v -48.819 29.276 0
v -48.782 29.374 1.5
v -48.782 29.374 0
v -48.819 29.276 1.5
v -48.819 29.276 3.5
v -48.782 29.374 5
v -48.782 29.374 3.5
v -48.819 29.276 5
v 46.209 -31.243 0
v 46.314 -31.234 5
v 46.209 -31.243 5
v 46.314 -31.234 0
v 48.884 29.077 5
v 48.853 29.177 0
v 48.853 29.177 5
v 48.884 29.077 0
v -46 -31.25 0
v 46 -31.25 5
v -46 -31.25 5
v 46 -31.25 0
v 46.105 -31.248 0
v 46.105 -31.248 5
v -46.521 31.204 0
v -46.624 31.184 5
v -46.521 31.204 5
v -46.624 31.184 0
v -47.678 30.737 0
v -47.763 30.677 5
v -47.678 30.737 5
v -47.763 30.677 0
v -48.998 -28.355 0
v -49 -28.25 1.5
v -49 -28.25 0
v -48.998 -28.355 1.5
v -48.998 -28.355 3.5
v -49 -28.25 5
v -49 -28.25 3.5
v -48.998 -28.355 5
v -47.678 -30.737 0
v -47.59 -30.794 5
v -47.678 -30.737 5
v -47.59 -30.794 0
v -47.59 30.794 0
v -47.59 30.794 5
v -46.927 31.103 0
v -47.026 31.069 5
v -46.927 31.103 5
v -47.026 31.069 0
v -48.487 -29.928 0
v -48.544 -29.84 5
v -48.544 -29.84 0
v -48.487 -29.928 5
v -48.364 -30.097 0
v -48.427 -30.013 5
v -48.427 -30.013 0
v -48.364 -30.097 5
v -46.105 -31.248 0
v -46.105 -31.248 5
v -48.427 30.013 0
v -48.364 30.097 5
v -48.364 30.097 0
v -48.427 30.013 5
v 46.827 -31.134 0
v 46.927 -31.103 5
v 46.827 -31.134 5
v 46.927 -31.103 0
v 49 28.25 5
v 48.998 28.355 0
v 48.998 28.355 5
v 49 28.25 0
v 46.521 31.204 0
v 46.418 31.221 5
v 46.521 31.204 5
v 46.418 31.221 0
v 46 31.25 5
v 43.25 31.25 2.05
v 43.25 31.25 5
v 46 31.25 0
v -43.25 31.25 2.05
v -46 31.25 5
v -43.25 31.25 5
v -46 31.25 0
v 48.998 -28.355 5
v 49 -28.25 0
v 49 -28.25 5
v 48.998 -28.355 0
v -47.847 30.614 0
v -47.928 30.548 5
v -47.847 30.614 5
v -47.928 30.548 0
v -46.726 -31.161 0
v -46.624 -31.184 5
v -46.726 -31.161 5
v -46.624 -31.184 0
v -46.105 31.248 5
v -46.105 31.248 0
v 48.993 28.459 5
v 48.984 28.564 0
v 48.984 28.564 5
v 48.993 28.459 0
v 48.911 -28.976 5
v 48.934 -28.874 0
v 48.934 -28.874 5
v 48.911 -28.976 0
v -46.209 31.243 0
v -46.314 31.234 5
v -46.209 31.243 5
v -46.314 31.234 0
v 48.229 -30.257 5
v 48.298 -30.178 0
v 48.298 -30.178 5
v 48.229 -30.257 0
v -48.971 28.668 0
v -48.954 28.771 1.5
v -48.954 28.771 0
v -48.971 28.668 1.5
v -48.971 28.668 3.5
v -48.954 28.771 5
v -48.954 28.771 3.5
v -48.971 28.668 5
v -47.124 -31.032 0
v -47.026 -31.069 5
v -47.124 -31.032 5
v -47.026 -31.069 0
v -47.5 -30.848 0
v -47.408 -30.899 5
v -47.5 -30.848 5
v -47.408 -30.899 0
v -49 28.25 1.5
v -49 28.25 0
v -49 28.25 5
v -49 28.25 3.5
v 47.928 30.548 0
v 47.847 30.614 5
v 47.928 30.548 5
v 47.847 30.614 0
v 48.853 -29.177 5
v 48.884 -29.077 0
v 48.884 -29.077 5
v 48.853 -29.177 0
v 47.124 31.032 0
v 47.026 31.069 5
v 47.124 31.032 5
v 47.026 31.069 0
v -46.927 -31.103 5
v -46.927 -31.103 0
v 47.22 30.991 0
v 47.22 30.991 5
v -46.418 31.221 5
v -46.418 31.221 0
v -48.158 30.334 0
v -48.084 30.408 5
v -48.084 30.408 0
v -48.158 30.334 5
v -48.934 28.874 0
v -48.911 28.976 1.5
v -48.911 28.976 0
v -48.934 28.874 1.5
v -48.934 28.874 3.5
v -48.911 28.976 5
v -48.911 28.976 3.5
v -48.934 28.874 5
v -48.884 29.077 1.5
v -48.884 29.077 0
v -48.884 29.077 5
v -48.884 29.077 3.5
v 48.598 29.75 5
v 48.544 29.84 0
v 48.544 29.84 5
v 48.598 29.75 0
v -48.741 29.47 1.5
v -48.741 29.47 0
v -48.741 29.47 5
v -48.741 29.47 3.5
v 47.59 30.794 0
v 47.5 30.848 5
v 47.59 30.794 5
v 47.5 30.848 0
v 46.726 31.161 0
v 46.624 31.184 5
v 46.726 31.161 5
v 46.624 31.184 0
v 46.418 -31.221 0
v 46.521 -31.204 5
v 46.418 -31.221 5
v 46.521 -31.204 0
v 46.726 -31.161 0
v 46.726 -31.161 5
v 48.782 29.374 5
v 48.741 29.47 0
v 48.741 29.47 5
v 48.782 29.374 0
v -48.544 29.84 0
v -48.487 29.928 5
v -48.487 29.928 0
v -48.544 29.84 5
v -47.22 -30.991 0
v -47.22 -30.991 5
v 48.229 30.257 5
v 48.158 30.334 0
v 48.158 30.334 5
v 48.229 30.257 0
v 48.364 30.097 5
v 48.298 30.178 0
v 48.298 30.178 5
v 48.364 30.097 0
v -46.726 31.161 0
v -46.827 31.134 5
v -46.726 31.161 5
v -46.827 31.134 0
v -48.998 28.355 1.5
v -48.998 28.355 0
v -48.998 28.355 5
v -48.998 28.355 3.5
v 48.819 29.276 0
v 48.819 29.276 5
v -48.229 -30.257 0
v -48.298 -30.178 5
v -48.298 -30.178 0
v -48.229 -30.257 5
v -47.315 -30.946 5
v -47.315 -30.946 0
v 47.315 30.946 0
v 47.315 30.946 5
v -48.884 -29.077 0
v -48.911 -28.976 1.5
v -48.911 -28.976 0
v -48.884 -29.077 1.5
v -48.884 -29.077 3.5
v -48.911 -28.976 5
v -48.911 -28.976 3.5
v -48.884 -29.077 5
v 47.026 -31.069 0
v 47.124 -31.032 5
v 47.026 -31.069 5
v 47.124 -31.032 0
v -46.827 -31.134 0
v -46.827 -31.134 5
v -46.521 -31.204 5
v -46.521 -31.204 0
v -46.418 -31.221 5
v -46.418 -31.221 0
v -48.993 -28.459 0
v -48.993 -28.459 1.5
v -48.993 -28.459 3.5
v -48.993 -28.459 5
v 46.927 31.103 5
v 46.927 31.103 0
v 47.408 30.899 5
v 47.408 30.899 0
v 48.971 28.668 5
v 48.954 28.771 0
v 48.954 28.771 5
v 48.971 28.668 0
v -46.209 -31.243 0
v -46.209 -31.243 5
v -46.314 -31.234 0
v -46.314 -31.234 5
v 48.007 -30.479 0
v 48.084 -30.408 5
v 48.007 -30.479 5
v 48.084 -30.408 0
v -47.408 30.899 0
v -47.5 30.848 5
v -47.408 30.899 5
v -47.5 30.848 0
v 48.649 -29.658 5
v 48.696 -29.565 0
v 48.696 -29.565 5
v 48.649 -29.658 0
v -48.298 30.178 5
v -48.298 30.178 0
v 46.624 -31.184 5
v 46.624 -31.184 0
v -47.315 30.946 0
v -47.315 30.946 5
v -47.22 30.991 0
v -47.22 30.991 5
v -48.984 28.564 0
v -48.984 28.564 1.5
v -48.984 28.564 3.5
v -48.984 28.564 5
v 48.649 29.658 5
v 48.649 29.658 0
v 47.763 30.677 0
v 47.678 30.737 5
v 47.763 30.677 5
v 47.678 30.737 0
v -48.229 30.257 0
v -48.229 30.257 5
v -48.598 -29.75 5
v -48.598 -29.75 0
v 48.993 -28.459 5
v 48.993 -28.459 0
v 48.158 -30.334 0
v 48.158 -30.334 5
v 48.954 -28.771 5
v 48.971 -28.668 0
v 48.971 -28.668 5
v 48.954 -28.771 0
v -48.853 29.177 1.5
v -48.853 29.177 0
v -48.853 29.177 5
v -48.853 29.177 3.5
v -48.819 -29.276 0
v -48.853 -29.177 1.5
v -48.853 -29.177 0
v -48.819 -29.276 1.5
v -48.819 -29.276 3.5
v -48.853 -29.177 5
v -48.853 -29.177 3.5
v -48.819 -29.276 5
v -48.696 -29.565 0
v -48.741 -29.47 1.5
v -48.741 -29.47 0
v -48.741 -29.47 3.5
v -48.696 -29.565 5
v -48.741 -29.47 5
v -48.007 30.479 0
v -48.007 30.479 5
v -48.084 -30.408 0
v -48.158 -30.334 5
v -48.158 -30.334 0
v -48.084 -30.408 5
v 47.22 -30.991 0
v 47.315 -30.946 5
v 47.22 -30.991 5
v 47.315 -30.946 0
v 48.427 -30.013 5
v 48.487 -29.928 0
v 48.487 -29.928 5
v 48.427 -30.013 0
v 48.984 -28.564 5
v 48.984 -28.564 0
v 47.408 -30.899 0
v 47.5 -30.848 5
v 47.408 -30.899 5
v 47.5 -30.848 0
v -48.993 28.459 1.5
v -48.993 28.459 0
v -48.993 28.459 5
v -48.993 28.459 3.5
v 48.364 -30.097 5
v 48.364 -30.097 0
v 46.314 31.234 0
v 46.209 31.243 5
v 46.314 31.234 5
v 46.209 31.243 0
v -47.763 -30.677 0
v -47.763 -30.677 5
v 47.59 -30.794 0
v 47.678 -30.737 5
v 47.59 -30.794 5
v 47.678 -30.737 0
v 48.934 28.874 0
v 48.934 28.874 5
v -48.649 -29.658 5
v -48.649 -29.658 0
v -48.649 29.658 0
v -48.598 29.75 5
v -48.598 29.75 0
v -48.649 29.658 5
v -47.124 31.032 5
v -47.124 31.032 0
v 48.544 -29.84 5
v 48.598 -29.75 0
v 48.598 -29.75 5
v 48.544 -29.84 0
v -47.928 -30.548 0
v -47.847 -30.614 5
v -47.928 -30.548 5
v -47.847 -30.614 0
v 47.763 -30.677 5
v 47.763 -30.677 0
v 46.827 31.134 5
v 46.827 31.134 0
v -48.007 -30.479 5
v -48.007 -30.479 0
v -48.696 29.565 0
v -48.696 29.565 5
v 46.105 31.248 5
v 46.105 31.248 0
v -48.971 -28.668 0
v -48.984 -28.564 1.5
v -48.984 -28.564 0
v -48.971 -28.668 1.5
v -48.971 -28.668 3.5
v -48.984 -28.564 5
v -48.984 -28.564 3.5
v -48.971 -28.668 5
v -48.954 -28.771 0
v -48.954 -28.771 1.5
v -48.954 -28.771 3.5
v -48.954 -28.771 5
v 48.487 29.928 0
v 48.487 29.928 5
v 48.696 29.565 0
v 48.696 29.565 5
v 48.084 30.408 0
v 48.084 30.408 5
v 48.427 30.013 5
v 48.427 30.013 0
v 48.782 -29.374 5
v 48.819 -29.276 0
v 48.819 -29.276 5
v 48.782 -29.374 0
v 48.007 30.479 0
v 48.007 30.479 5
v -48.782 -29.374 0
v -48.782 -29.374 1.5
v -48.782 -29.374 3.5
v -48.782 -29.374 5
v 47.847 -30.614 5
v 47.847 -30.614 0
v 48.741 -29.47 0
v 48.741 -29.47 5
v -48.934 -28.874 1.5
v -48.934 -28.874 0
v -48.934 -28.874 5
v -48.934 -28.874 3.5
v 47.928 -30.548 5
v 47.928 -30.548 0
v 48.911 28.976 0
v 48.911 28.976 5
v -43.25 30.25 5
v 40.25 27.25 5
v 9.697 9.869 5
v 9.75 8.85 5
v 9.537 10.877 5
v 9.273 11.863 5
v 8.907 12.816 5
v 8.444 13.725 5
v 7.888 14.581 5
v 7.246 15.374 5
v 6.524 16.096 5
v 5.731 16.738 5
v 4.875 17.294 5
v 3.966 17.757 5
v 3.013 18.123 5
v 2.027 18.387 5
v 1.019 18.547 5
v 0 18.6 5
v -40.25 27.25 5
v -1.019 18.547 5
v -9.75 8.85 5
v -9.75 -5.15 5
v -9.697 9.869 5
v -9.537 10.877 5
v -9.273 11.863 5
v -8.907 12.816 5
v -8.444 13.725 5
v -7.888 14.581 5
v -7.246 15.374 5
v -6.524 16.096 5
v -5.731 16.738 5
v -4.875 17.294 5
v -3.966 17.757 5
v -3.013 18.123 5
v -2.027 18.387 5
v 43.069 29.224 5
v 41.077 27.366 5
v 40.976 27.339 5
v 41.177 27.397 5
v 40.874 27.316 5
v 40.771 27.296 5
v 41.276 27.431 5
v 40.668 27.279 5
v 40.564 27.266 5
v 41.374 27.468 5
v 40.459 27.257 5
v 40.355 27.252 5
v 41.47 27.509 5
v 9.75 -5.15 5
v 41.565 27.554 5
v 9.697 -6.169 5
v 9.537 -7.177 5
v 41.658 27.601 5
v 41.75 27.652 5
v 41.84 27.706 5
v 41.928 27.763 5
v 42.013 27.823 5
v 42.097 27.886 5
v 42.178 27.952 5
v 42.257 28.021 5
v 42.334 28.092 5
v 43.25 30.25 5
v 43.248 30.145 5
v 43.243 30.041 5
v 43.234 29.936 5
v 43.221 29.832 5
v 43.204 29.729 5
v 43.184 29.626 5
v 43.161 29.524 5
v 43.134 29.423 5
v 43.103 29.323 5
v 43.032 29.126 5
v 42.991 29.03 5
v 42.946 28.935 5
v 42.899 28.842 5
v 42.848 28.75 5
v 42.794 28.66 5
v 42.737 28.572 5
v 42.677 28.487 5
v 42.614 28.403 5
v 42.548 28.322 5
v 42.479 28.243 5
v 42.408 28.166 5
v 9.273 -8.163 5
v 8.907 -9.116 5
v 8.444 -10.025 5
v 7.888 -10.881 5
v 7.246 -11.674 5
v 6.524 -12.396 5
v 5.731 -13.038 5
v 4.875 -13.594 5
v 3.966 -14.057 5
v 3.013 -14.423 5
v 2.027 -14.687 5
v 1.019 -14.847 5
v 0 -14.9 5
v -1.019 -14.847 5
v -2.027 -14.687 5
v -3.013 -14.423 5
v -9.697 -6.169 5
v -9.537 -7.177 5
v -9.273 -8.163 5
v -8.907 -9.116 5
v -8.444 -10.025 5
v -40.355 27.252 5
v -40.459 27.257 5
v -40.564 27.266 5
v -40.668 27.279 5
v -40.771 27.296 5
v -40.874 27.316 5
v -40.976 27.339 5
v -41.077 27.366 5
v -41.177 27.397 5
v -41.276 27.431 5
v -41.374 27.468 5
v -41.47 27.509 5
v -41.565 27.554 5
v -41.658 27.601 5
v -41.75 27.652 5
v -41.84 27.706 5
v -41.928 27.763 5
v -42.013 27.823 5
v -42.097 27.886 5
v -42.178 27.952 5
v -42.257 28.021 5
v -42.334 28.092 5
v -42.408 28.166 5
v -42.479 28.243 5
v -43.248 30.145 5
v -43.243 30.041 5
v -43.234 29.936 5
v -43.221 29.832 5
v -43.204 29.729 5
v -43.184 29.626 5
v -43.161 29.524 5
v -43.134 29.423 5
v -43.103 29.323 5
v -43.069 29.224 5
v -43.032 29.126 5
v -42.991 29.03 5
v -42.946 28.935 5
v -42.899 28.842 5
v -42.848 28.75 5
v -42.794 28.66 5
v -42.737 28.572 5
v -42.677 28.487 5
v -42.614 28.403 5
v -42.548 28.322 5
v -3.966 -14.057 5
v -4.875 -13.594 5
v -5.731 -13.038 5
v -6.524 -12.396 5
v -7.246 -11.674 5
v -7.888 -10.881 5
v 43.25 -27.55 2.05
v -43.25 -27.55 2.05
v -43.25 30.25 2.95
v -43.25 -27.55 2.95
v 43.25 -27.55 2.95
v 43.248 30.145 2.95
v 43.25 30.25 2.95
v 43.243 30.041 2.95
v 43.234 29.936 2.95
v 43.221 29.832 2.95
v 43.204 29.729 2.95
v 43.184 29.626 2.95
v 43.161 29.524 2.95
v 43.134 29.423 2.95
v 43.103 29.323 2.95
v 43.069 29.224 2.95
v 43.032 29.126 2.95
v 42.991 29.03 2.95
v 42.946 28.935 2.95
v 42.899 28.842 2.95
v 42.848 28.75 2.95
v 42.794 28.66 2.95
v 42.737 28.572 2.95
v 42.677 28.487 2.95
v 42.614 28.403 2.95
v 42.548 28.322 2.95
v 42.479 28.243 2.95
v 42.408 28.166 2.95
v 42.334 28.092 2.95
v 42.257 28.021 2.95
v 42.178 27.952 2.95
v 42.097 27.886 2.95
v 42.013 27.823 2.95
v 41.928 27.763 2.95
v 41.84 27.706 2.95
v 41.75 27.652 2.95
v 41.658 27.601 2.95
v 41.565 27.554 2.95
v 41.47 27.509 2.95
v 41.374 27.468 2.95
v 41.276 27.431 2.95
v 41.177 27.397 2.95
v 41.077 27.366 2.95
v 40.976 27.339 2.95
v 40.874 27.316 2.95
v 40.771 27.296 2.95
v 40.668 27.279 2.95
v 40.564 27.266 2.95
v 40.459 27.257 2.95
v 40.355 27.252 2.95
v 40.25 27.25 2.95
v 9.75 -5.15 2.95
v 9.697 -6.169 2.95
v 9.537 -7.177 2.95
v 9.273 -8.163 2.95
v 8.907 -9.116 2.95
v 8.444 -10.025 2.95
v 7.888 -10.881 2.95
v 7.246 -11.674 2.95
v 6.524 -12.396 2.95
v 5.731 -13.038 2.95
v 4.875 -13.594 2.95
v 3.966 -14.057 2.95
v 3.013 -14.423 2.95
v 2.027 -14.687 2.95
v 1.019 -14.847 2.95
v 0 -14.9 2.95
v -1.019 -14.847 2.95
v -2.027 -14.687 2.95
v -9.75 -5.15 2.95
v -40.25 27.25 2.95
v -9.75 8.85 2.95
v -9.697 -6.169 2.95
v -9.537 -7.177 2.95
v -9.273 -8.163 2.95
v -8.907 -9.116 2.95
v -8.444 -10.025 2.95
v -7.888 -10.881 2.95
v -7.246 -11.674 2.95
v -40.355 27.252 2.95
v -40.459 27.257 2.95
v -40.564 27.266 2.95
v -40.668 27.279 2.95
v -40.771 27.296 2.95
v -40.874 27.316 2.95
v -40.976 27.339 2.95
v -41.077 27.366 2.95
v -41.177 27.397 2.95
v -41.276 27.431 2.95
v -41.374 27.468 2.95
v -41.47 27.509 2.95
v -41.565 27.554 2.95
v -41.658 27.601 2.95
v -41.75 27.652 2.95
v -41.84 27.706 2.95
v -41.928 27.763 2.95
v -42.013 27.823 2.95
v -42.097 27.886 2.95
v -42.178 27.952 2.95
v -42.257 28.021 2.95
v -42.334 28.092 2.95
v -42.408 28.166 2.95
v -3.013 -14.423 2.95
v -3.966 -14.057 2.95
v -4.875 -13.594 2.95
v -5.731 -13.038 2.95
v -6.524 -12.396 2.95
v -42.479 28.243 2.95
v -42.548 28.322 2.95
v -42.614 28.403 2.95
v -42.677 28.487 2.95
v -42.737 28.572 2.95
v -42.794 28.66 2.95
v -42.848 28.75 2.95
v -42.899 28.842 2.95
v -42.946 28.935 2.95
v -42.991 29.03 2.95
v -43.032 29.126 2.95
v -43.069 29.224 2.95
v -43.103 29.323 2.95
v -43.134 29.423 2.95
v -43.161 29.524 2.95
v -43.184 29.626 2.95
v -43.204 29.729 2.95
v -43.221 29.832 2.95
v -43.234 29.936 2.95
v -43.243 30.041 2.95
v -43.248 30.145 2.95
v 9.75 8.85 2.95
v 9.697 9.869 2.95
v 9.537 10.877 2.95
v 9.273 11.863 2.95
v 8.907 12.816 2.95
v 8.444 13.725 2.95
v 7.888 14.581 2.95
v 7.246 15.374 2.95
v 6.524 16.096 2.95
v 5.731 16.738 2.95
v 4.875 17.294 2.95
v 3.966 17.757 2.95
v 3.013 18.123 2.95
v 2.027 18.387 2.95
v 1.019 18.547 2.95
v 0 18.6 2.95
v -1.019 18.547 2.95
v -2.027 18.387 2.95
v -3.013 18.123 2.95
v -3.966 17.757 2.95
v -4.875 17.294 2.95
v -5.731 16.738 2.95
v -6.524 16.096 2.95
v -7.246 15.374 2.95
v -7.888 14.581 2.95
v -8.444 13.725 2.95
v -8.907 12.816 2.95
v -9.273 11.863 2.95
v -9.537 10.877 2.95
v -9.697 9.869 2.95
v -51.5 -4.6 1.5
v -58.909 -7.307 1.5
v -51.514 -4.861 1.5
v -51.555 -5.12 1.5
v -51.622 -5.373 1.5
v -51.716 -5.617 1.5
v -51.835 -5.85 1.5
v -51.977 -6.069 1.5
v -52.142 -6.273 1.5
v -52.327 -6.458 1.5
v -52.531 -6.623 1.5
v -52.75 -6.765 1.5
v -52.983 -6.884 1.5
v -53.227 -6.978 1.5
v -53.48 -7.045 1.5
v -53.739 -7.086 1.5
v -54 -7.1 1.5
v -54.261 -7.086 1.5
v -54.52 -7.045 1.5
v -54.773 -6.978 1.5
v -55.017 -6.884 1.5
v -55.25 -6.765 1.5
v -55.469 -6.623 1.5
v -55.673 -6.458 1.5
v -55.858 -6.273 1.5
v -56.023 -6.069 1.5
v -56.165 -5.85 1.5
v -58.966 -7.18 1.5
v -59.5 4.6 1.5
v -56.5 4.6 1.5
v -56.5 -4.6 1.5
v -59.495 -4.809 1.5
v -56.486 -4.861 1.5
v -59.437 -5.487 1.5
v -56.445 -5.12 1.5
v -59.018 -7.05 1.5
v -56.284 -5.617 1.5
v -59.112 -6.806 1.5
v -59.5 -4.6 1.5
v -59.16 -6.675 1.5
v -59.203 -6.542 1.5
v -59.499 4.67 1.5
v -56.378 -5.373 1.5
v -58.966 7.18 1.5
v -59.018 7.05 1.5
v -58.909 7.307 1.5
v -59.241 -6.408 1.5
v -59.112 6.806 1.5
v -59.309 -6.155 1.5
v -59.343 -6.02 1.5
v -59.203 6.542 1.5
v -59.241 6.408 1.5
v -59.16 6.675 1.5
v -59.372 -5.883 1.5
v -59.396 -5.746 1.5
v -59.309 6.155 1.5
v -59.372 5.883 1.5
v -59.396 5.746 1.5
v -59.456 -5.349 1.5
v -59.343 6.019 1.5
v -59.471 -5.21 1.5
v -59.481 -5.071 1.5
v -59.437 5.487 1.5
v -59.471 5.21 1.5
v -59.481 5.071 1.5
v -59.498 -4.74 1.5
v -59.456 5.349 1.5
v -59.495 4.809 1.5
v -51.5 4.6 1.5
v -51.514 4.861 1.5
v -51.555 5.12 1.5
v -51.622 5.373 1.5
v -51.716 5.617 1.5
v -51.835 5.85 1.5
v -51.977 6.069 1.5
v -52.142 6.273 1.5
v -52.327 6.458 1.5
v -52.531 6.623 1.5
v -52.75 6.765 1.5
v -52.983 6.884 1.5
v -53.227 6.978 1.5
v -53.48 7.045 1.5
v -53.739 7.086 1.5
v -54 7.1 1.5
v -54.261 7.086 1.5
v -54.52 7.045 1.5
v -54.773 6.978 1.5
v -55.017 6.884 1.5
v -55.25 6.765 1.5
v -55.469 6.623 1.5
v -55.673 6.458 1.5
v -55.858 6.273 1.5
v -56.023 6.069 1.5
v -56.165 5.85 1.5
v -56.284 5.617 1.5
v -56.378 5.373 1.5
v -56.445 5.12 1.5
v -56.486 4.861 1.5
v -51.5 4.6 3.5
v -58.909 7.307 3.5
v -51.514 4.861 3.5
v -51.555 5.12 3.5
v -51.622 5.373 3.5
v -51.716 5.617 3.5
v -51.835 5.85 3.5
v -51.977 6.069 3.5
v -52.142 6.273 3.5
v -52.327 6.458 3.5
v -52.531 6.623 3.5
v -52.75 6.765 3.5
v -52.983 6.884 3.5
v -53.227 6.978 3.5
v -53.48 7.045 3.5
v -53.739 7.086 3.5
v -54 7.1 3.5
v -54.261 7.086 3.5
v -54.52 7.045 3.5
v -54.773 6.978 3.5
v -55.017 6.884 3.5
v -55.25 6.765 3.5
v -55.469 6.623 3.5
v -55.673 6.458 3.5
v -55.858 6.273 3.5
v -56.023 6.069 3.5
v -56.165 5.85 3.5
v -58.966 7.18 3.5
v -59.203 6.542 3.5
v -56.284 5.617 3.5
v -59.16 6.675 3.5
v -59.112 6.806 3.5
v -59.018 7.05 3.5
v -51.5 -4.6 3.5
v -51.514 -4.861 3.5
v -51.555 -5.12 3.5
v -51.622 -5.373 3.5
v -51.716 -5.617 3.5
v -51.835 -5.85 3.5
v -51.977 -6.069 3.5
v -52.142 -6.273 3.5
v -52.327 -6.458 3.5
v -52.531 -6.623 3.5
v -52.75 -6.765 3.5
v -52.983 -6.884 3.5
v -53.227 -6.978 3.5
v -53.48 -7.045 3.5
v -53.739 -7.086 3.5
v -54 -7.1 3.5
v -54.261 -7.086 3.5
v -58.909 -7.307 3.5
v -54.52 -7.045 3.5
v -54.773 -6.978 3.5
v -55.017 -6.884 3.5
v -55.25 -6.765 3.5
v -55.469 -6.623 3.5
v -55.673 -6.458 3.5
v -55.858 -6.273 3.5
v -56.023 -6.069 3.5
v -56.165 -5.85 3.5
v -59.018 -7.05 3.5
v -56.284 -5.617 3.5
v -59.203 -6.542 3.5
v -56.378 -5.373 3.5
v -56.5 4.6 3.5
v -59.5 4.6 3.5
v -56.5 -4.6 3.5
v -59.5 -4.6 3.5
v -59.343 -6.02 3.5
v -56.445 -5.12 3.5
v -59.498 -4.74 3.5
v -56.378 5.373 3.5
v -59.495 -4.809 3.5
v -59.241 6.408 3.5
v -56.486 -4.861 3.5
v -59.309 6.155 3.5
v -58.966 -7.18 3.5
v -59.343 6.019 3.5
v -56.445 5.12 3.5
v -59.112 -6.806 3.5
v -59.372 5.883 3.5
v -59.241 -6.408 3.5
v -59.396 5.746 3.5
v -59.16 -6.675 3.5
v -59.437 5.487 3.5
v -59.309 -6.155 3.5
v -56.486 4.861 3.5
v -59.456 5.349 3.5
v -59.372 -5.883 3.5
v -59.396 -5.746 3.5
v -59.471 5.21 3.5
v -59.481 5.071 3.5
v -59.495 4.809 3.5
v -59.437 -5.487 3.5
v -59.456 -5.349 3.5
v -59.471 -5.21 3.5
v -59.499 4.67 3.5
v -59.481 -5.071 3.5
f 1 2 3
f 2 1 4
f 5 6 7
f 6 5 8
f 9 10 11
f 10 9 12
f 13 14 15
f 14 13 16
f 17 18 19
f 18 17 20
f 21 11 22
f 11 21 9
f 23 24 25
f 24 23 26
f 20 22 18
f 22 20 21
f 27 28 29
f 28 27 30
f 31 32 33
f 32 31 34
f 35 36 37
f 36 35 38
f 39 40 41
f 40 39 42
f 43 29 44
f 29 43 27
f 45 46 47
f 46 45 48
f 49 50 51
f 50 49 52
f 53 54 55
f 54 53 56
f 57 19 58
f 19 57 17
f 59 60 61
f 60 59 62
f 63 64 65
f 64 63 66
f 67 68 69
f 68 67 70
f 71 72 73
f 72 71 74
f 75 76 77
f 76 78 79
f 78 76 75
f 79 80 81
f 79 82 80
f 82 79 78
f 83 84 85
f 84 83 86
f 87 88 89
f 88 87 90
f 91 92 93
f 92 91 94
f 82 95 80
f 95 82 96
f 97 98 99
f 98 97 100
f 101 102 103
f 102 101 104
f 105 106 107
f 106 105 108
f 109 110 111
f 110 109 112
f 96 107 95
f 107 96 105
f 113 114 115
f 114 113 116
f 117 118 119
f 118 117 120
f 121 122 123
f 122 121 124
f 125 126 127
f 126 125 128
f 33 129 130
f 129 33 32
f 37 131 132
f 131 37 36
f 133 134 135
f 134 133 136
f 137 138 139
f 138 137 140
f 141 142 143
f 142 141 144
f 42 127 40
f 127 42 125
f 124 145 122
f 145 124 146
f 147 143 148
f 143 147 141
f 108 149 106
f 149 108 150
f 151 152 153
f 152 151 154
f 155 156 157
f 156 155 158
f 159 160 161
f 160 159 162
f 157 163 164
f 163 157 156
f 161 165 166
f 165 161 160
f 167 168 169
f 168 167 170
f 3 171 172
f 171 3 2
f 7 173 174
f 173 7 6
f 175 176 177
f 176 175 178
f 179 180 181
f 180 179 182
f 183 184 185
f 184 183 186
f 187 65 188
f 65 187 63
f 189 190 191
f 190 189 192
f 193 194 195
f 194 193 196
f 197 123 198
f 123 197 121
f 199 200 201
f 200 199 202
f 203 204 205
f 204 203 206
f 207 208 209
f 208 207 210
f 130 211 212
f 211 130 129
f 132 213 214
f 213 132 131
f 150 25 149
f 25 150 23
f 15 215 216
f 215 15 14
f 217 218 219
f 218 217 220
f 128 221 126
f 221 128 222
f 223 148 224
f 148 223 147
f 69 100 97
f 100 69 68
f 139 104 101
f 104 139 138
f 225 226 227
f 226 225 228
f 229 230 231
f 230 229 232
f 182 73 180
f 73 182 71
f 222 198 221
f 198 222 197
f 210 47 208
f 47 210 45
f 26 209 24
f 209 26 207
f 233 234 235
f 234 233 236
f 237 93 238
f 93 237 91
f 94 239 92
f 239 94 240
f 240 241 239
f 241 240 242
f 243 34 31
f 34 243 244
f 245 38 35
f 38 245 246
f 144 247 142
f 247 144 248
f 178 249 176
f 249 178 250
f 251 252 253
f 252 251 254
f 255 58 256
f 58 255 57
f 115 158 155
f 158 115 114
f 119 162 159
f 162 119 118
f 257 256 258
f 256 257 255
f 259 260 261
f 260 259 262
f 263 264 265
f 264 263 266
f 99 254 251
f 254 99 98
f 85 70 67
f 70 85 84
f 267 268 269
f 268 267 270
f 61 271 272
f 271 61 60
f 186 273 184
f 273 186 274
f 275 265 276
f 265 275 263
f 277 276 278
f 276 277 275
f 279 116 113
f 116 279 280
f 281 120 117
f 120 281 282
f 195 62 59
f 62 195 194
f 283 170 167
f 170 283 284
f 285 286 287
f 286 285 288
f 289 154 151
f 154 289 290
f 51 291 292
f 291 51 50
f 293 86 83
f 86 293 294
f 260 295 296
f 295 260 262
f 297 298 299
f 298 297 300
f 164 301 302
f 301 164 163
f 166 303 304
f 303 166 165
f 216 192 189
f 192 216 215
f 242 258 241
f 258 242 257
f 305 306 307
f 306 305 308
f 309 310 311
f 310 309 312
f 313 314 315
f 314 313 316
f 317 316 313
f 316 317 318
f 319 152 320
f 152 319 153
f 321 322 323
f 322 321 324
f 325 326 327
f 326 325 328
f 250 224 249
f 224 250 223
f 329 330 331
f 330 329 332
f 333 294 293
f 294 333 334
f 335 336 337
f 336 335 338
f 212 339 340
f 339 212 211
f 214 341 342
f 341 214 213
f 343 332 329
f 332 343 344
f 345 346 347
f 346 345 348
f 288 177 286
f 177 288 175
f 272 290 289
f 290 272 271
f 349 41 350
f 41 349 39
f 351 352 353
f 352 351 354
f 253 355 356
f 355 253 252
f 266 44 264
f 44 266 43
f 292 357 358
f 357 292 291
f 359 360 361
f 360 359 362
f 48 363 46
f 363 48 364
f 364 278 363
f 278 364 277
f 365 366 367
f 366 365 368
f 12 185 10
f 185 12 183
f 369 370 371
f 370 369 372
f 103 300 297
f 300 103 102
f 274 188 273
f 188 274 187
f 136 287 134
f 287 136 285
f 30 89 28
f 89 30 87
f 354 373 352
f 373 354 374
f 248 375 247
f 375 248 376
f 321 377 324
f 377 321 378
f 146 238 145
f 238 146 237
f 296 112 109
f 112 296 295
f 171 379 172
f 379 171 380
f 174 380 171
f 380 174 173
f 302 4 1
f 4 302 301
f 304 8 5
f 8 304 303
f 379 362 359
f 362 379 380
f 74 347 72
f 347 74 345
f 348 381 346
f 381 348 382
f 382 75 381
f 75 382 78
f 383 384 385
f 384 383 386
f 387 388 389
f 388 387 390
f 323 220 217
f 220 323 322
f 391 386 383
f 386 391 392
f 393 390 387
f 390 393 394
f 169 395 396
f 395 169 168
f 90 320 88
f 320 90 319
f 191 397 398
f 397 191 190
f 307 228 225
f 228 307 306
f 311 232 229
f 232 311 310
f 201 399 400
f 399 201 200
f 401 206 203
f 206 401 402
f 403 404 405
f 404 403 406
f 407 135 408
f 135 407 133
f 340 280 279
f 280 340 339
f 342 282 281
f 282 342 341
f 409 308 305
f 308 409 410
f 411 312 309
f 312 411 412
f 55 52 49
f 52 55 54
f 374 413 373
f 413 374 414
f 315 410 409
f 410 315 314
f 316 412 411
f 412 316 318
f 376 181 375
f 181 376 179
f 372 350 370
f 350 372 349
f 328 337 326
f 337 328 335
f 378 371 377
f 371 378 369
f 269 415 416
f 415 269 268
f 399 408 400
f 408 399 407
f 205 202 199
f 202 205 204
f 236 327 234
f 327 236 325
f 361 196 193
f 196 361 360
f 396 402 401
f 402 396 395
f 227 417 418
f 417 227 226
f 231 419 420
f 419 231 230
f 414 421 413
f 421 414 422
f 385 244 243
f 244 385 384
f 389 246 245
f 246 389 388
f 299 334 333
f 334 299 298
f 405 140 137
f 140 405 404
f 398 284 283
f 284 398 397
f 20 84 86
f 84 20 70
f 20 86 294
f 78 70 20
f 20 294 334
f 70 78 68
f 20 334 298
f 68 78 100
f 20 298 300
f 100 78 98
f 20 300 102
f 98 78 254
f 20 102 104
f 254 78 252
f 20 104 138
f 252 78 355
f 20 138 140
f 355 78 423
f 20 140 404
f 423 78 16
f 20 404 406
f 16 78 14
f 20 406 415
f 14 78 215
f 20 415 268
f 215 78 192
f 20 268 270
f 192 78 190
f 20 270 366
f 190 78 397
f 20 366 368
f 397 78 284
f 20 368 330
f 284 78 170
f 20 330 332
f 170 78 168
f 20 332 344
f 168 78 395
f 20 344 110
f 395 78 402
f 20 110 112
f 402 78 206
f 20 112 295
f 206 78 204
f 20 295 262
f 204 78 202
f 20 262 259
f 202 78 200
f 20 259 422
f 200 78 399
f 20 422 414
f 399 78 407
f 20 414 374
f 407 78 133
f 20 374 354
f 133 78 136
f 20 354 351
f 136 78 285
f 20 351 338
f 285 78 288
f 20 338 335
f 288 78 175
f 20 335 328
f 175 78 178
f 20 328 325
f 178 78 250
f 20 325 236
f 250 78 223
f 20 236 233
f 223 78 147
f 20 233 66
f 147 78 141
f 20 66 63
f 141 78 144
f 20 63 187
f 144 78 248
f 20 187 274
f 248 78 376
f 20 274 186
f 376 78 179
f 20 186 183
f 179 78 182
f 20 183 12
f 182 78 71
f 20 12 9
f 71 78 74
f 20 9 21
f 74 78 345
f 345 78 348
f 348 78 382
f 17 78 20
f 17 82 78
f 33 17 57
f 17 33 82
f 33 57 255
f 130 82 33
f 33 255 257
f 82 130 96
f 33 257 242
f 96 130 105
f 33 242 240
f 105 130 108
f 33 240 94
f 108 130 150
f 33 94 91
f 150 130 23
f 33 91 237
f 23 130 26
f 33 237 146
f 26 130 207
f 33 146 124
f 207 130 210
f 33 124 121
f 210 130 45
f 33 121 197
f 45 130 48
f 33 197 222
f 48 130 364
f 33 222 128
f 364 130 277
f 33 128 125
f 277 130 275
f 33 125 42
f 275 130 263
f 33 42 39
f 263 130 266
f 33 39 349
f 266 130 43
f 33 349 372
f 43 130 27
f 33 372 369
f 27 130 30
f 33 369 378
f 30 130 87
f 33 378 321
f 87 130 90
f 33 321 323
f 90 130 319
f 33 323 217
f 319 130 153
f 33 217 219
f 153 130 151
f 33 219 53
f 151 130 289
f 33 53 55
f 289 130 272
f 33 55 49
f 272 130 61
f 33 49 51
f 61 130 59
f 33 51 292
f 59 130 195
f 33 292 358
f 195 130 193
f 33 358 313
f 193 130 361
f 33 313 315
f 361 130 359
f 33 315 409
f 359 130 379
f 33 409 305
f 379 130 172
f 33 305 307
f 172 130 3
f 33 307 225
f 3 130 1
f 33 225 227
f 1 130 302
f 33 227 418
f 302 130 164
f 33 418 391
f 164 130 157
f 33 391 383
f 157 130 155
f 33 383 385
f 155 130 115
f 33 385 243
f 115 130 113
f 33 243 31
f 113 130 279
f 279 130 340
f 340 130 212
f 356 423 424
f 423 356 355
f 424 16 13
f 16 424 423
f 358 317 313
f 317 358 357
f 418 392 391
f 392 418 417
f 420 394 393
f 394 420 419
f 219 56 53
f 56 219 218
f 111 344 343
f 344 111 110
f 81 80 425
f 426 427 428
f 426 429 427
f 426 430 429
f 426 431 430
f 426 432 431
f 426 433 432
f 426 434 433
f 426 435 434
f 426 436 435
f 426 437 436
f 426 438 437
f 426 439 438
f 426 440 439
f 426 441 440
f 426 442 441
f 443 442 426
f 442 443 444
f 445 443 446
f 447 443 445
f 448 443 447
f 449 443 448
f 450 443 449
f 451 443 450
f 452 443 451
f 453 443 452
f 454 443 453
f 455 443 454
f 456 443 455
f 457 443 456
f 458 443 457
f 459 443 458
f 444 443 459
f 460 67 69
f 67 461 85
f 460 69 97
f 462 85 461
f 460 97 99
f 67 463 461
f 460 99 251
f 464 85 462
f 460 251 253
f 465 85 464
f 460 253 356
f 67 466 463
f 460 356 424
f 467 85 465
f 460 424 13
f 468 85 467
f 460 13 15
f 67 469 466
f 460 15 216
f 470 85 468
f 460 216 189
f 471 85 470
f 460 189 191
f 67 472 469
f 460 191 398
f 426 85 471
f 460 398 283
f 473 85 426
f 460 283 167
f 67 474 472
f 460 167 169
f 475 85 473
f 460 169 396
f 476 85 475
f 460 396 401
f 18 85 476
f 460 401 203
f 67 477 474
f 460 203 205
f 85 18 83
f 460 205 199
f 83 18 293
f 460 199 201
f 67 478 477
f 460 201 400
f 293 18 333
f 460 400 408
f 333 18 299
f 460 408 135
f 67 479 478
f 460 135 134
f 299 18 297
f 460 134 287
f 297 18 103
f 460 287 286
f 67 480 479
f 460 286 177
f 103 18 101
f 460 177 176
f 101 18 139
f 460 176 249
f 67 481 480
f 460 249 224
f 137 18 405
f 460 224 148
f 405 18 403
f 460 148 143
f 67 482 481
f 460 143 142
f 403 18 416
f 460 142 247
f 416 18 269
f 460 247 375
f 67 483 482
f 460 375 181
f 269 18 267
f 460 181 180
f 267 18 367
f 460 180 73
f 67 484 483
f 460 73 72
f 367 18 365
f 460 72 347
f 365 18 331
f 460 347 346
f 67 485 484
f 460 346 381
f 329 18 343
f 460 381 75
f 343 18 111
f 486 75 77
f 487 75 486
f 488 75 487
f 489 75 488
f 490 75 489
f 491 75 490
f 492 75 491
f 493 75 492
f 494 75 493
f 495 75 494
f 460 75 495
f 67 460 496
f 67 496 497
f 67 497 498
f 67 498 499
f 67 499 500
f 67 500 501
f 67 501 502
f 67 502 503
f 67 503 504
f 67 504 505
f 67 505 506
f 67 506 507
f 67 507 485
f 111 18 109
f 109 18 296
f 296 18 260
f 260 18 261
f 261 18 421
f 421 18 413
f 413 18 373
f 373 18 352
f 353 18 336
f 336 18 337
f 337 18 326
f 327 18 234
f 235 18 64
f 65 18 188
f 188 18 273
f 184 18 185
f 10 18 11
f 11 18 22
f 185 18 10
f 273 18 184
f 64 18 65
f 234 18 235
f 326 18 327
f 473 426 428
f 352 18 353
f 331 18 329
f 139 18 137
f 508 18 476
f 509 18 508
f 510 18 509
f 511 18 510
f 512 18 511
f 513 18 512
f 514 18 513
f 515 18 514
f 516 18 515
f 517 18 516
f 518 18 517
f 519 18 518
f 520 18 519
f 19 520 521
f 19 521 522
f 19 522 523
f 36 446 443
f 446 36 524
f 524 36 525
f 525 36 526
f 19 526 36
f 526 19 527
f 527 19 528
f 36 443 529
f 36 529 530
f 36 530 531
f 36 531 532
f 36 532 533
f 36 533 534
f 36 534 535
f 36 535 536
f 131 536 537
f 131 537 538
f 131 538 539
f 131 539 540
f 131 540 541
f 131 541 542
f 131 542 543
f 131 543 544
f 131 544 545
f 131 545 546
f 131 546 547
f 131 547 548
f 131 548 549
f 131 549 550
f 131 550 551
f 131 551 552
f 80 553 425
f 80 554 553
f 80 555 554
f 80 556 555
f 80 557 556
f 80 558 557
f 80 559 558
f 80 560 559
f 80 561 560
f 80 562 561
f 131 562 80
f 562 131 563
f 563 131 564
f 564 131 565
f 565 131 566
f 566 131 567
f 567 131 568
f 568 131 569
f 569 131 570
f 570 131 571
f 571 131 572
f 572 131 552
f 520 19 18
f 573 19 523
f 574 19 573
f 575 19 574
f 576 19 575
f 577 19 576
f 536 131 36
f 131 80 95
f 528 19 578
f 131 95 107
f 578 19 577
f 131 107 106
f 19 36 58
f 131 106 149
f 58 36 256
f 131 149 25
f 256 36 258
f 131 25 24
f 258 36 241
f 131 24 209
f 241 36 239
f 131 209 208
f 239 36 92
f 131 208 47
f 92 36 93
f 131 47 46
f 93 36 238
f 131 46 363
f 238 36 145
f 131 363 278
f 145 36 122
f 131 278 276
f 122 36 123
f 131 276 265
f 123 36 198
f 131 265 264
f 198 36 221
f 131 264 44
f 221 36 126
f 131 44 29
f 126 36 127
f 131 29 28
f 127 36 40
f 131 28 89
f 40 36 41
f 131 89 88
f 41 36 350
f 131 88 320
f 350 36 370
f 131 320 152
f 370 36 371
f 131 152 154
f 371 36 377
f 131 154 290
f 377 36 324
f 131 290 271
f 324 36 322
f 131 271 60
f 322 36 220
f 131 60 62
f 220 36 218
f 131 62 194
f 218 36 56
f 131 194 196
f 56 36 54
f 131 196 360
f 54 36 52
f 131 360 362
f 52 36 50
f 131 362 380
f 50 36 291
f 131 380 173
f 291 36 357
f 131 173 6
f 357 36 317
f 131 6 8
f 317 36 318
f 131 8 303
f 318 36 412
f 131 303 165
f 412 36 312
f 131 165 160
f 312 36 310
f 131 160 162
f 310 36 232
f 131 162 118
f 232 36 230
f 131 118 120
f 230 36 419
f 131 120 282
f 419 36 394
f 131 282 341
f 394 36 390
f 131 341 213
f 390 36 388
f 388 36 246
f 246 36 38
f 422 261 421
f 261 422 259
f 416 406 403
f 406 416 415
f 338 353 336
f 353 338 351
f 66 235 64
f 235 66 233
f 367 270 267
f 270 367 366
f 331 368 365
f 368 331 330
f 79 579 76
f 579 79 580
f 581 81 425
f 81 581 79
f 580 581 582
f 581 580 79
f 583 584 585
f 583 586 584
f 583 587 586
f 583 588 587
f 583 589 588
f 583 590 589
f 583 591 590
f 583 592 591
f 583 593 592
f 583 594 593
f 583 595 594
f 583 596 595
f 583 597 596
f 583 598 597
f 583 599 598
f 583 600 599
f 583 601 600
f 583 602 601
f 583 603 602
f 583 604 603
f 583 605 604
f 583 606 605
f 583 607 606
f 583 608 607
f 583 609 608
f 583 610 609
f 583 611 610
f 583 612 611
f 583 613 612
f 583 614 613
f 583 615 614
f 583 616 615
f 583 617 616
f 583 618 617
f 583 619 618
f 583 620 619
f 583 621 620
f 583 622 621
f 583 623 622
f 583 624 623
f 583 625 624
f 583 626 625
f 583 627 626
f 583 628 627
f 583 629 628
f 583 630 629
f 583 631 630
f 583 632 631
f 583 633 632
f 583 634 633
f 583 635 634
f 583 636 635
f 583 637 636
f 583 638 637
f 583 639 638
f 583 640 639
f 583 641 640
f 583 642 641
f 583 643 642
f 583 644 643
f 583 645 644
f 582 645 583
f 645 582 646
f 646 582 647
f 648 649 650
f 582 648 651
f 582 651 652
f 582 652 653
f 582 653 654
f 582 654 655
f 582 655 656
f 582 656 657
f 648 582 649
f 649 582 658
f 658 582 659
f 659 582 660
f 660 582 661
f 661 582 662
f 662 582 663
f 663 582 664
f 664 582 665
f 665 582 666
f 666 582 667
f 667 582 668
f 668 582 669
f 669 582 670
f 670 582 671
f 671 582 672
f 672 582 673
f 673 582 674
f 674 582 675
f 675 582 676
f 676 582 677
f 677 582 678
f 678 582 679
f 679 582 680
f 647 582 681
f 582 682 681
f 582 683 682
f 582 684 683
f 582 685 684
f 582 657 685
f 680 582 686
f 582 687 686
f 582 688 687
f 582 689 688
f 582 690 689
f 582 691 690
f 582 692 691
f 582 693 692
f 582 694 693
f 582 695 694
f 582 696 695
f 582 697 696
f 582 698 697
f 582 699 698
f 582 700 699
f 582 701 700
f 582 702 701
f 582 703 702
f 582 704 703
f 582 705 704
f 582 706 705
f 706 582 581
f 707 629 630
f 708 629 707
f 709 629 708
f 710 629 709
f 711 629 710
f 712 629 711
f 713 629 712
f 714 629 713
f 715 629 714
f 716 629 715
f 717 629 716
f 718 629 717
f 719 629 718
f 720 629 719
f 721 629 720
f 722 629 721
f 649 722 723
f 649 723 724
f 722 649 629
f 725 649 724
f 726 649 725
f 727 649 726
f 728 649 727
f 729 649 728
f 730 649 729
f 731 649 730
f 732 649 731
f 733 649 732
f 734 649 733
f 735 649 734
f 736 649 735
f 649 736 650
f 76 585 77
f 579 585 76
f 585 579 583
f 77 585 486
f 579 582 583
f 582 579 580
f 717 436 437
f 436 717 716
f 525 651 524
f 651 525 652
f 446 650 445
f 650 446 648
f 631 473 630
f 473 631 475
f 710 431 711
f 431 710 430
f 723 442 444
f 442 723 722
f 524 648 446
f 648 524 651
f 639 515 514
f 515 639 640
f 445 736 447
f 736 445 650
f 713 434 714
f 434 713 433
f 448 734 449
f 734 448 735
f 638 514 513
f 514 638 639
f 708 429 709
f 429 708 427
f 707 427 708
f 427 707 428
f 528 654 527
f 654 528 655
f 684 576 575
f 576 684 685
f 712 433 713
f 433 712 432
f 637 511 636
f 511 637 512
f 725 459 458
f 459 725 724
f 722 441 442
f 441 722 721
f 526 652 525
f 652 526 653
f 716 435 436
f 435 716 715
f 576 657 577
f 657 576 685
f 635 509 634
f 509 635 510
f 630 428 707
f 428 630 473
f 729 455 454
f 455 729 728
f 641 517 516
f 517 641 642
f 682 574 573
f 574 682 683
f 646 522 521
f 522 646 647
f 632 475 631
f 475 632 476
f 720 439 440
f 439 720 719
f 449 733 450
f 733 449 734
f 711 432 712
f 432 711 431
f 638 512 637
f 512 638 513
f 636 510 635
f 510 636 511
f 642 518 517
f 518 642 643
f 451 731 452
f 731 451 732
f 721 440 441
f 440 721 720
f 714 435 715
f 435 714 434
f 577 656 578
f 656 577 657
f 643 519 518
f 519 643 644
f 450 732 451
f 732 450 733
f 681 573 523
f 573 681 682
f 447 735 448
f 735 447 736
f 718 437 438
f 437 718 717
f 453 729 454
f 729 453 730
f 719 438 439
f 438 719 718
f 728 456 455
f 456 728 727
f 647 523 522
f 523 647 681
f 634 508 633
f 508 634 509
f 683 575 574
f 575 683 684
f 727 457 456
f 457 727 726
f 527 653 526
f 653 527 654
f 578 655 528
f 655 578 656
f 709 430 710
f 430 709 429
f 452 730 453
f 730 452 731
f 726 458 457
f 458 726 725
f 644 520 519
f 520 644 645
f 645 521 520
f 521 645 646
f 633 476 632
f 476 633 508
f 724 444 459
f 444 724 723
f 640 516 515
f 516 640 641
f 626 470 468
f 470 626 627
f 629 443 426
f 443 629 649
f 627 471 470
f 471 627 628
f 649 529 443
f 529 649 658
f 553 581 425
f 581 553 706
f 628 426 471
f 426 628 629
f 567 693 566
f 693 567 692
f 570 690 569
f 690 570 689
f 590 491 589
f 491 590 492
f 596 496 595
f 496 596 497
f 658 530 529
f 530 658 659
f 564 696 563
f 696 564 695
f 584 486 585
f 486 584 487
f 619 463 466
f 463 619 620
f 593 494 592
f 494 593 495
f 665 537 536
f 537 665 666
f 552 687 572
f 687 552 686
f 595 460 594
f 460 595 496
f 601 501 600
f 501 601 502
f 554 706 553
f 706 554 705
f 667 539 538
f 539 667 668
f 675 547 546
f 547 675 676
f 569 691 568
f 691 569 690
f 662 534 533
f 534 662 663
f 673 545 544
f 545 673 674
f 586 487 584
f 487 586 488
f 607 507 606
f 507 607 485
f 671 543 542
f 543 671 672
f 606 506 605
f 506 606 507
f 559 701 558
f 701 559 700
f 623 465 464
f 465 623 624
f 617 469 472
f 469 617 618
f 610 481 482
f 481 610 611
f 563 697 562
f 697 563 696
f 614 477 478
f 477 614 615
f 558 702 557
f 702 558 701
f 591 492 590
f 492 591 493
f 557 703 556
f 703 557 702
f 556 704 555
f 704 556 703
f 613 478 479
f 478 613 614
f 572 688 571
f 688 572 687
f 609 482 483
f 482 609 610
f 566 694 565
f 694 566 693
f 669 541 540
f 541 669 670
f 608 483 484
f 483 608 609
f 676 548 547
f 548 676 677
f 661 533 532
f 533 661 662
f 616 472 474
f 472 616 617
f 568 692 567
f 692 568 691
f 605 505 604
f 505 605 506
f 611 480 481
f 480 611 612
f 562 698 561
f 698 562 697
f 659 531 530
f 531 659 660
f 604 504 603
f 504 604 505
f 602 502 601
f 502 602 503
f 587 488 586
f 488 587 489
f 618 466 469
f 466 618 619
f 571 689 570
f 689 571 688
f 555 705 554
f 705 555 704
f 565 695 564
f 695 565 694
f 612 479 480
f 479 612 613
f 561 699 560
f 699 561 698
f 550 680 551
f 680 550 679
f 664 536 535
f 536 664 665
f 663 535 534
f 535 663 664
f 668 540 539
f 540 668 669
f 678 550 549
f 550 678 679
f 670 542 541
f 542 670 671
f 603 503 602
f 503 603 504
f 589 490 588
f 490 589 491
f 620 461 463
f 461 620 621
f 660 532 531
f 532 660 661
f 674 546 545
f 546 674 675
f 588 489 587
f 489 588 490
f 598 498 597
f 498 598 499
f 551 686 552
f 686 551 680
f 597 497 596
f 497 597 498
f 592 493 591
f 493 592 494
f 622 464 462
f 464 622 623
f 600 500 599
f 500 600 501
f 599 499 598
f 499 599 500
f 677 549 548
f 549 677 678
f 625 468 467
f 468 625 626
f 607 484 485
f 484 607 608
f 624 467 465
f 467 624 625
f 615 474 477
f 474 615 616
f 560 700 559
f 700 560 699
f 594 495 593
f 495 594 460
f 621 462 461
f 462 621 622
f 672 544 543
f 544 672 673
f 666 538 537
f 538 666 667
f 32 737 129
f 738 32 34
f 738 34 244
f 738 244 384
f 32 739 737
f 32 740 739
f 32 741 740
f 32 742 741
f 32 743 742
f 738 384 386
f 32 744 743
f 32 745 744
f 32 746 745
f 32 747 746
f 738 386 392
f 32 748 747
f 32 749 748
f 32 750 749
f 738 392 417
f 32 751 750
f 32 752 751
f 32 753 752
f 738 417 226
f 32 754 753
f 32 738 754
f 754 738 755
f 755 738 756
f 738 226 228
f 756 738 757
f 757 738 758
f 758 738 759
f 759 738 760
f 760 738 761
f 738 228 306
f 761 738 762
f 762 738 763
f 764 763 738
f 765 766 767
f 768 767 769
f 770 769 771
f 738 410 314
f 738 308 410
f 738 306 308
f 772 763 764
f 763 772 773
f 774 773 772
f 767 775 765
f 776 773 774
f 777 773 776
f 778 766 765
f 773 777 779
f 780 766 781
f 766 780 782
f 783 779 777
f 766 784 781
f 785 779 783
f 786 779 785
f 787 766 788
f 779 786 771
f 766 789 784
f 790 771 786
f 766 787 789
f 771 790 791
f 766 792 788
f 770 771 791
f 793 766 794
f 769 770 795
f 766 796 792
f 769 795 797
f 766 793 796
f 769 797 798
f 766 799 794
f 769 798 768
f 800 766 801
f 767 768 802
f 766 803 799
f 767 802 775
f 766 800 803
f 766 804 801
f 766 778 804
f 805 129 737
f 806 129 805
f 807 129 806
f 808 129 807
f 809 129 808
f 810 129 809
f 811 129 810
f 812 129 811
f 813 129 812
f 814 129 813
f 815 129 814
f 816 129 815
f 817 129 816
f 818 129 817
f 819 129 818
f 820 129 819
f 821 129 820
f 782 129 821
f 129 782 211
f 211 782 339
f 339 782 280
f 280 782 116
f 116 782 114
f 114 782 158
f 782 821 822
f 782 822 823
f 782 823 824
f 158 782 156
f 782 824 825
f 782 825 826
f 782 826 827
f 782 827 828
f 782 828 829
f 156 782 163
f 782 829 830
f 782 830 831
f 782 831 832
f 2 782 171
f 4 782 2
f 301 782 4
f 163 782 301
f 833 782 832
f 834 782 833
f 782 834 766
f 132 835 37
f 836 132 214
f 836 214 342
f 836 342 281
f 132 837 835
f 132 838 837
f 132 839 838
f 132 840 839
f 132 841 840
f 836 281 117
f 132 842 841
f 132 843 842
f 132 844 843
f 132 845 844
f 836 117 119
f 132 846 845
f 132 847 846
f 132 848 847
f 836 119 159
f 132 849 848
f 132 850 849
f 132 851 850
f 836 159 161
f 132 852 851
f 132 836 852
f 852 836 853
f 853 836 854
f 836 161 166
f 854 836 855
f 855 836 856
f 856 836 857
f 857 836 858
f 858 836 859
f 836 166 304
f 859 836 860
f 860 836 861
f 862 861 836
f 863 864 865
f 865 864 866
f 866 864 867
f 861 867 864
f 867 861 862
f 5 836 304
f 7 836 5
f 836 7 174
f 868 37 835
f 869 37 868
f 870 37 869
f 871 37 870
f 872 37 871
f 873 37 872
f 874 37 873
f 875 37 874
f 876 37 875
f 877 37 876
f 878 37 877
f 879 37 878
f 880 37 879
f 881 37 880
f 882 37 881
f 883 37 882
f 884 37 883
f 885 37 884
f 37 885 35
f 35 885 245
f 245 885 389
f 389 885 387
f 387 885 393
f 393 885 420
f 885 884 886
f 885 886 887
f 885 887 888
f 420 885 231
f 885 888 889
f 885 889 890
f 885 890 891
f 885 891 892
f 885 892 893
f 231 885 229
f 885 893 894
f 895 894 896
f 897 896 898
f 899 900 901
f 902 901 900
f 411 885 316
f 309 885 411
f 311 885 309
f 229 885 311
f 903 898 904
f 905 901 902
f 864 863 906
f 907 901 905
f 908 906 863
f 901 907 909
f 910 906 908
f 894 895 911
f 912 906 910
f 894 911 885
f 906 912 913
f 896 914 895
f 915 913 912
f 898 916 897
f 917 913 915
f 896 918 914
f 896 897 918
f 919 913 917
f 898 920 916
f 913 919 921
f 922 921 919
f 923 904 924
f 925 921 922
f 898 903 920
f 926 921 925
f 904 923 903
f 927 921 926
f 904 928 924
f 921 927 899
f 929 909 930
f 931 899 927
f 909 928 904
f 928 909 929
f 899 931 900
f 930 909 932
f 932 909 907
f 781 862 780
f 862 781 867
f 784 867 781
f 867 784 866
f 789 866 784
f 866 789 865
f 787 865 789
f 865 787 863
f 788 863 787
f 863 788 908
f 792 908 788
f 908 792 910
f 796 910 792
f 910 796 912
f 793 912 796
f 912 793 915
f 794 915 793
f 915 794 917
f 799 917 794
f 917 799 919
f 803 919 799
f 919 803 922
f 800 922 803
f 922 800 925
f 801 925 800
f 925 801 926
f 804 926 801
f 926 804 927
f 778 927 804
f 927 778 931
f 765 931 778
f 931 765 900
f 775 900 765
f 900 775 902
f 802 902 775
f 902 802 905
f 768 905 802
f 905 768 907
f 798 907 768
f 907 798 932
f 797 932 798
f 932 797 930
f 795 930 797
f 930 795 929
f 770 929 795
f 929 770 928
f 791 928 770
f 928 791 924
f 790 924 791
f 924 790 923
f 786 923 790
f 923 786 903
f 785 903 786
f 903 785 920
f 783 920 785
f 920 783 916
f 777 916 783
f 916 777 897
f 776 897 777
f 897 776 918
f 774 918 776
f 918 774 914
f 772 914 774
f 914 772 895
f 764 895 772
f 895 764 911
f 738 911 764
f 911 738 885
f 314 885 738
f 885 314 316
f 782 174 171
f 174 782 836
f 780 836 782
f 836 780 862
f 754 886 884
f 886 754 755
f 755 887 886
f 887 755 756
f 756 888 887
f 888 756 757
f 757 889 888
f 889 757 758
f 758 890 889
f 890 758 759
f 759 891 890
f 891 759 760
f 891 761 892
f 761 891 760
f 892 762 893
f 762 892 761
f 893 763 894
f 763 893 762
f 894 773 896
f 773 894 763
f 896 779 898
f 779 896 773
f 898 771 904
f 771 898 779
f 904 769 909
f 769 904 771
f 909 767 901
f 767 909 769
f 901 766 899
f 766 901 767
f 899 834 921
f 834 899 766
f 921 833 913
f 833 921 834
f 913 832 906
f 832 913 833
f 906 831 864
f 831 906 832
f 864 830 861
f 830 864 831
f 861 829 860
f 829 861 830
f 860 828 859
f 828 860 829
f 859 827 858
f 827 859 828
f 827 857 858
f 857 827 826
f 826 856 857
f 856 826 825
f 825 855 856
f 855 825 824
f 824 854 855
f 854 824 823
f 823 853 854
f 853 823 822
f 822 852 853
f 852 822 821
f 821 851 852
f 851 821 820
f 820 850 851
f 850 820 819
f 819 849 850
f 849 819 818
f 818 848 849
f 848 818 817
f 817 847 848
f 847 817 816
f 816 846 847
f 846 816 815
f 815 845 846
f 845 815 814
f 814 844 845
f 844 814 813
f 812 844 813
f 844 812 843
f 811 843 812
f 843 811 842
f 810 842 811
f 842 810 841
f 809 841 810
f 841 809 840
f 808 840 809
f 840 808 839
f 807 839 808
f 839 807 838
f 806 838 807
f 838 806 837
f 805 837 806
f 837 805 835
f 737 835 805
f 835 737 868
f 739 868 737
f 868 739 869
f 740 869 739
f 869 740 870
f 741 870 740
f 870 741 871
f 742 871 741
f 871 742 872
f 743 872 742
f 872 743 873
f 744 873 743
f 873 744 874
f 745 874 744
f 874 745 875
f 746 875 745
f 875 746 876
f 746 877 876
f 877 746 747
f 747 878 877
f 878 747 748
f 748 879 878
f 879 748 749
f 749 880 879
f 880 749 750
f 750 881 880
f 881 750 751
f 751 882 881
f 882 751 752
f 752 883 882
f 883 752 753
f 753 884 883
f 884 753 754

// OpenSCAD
inch = 25.4;
$fs=0.1;
$fa=2;

holderRounding = 3;
sliceRounding = 3;

fingerGapDia = 19.5;
fingerGapLen = 33.5-fingerGapDia;

cardSlotDims = [ // l,w,h
    86.5,
    53.8+5.0, // card rests 5mm inside of holder
    0.9,
];

ringHoleOffset=0;
ringHoleDia=5.0;
ringHoleLen=14.2-ringHoleDia;
ringWallThick=4;
ringAttachThick=2;

rimSliceDims = [
    cardSlotDims[0],
    4.0+sliceRounding
];

cardHolderDims = [ // l,w,h
    98.0, 
    62.5,
    5.0
];

module wantRect(l, w) {
    translate([-l/2,-w/2,0])
        square([l, w]);
}

module wantCirc(s) {
    circle(d=s,$fn=60);
}

module cardSlot2D() {
    wantRect(cardSlotDims[0], cardSlotDims[1]);
}

module cardSlot() {
    linear_extrude(height=cardSlotDims[2], convexity=4)
        cardSlot2D();
}

module cardHolder2D() {
    wantRect(cardHolderDims[0], cardHolderDims[1]);
}

module roundedCardHolder2D() {
    offset(r=holderRounding)
    offset(r=-holderRounding)
    cardHolder2D();
}

module cardHolder() {
    linear_extrude(height=cardHolderDims[2], convexity=4)
        roundedCardHolder2D();
}


cardElev=cardHolderDims[2]/2-cardSlotDims[2]/2;
cardOffset=(cardHolderDims[1]-cardSlotDims[1])/2;
module slottedHolder() {
    difference() {
        cardHolder();
        translate([0,cardOffset,cardElev])
            #cardSlot();
    }
}

module fingerGap2D() {
    hull() {
        translate([0,fingerGapLen/2,0])
        wantCirc(fingerGapDia);
        translate([0,-fingerGapLen/2,0])
        wantCirc(fingerGapDia);
    }

}

module fingerGap() {
    linear_extrude(height=cardHolderDims[2]/2, convexity=4)
        fingerGap2D();
}

module fingerGappedHolder() {
    difference() {
        slottedHolder();
        translate([0,cardOffset,cardHolderDims[2]/2])
        fingerGap();
    }
}

module rimSlice2D() {
    translate([0,cardHolderDims[1]/2-rimSliceDims[1]/2+sliceRounding,0])
    wantRect(rimSliceDims[0], rimSliceDims[1]);
}

module rimSlice() {
    translate([0,0,cardHolderDims[2]/2+cardSlotDims[2]/2])
    linear_extrude(height=cardHolderDims[2]/2, convexity=4)
        offset(r=sliceRounding) 
        offset(r=-sliceRounding)
        rimSlice2D();
}

module slicedCardHolder() {
    difference() {
        fingerGappedHolder();
        #rimSlice();
    }
}

module ringHole2D() {
    hull() {
        translate([0,ringHoleLen/2,0])
        wantCirc(ringHoleDia);
        translate([0,-ringHoleLen/2,0])
        wantCirc(ringHoleDia);
    }
}


module ringAttachment2D() {
    difference() {
    difference() {
        hull() {
            roundedCardHolder2D();
            translate([-cardHolderDims[0]/2-ringWallThick-ringHoleOffset,0,0])
            offset(r=ringWallThick)
            ringHole2D();
        }
        translate([-cardHolderDims[0]/2-ringHoleOffset-ringHoleDia,0,0])
        ringHole2D();
    }
    roundedCardHolder2D();
    }
}

module ringAttachment() {
    translate([0,0,cardHolderDims[2]/2-ringAttachThick/2])
    linear_extrude(height=ringAttachThick, convexity=4)
        ringAttachment2D();
}

slicedCardHolder();
ringAttachment();
